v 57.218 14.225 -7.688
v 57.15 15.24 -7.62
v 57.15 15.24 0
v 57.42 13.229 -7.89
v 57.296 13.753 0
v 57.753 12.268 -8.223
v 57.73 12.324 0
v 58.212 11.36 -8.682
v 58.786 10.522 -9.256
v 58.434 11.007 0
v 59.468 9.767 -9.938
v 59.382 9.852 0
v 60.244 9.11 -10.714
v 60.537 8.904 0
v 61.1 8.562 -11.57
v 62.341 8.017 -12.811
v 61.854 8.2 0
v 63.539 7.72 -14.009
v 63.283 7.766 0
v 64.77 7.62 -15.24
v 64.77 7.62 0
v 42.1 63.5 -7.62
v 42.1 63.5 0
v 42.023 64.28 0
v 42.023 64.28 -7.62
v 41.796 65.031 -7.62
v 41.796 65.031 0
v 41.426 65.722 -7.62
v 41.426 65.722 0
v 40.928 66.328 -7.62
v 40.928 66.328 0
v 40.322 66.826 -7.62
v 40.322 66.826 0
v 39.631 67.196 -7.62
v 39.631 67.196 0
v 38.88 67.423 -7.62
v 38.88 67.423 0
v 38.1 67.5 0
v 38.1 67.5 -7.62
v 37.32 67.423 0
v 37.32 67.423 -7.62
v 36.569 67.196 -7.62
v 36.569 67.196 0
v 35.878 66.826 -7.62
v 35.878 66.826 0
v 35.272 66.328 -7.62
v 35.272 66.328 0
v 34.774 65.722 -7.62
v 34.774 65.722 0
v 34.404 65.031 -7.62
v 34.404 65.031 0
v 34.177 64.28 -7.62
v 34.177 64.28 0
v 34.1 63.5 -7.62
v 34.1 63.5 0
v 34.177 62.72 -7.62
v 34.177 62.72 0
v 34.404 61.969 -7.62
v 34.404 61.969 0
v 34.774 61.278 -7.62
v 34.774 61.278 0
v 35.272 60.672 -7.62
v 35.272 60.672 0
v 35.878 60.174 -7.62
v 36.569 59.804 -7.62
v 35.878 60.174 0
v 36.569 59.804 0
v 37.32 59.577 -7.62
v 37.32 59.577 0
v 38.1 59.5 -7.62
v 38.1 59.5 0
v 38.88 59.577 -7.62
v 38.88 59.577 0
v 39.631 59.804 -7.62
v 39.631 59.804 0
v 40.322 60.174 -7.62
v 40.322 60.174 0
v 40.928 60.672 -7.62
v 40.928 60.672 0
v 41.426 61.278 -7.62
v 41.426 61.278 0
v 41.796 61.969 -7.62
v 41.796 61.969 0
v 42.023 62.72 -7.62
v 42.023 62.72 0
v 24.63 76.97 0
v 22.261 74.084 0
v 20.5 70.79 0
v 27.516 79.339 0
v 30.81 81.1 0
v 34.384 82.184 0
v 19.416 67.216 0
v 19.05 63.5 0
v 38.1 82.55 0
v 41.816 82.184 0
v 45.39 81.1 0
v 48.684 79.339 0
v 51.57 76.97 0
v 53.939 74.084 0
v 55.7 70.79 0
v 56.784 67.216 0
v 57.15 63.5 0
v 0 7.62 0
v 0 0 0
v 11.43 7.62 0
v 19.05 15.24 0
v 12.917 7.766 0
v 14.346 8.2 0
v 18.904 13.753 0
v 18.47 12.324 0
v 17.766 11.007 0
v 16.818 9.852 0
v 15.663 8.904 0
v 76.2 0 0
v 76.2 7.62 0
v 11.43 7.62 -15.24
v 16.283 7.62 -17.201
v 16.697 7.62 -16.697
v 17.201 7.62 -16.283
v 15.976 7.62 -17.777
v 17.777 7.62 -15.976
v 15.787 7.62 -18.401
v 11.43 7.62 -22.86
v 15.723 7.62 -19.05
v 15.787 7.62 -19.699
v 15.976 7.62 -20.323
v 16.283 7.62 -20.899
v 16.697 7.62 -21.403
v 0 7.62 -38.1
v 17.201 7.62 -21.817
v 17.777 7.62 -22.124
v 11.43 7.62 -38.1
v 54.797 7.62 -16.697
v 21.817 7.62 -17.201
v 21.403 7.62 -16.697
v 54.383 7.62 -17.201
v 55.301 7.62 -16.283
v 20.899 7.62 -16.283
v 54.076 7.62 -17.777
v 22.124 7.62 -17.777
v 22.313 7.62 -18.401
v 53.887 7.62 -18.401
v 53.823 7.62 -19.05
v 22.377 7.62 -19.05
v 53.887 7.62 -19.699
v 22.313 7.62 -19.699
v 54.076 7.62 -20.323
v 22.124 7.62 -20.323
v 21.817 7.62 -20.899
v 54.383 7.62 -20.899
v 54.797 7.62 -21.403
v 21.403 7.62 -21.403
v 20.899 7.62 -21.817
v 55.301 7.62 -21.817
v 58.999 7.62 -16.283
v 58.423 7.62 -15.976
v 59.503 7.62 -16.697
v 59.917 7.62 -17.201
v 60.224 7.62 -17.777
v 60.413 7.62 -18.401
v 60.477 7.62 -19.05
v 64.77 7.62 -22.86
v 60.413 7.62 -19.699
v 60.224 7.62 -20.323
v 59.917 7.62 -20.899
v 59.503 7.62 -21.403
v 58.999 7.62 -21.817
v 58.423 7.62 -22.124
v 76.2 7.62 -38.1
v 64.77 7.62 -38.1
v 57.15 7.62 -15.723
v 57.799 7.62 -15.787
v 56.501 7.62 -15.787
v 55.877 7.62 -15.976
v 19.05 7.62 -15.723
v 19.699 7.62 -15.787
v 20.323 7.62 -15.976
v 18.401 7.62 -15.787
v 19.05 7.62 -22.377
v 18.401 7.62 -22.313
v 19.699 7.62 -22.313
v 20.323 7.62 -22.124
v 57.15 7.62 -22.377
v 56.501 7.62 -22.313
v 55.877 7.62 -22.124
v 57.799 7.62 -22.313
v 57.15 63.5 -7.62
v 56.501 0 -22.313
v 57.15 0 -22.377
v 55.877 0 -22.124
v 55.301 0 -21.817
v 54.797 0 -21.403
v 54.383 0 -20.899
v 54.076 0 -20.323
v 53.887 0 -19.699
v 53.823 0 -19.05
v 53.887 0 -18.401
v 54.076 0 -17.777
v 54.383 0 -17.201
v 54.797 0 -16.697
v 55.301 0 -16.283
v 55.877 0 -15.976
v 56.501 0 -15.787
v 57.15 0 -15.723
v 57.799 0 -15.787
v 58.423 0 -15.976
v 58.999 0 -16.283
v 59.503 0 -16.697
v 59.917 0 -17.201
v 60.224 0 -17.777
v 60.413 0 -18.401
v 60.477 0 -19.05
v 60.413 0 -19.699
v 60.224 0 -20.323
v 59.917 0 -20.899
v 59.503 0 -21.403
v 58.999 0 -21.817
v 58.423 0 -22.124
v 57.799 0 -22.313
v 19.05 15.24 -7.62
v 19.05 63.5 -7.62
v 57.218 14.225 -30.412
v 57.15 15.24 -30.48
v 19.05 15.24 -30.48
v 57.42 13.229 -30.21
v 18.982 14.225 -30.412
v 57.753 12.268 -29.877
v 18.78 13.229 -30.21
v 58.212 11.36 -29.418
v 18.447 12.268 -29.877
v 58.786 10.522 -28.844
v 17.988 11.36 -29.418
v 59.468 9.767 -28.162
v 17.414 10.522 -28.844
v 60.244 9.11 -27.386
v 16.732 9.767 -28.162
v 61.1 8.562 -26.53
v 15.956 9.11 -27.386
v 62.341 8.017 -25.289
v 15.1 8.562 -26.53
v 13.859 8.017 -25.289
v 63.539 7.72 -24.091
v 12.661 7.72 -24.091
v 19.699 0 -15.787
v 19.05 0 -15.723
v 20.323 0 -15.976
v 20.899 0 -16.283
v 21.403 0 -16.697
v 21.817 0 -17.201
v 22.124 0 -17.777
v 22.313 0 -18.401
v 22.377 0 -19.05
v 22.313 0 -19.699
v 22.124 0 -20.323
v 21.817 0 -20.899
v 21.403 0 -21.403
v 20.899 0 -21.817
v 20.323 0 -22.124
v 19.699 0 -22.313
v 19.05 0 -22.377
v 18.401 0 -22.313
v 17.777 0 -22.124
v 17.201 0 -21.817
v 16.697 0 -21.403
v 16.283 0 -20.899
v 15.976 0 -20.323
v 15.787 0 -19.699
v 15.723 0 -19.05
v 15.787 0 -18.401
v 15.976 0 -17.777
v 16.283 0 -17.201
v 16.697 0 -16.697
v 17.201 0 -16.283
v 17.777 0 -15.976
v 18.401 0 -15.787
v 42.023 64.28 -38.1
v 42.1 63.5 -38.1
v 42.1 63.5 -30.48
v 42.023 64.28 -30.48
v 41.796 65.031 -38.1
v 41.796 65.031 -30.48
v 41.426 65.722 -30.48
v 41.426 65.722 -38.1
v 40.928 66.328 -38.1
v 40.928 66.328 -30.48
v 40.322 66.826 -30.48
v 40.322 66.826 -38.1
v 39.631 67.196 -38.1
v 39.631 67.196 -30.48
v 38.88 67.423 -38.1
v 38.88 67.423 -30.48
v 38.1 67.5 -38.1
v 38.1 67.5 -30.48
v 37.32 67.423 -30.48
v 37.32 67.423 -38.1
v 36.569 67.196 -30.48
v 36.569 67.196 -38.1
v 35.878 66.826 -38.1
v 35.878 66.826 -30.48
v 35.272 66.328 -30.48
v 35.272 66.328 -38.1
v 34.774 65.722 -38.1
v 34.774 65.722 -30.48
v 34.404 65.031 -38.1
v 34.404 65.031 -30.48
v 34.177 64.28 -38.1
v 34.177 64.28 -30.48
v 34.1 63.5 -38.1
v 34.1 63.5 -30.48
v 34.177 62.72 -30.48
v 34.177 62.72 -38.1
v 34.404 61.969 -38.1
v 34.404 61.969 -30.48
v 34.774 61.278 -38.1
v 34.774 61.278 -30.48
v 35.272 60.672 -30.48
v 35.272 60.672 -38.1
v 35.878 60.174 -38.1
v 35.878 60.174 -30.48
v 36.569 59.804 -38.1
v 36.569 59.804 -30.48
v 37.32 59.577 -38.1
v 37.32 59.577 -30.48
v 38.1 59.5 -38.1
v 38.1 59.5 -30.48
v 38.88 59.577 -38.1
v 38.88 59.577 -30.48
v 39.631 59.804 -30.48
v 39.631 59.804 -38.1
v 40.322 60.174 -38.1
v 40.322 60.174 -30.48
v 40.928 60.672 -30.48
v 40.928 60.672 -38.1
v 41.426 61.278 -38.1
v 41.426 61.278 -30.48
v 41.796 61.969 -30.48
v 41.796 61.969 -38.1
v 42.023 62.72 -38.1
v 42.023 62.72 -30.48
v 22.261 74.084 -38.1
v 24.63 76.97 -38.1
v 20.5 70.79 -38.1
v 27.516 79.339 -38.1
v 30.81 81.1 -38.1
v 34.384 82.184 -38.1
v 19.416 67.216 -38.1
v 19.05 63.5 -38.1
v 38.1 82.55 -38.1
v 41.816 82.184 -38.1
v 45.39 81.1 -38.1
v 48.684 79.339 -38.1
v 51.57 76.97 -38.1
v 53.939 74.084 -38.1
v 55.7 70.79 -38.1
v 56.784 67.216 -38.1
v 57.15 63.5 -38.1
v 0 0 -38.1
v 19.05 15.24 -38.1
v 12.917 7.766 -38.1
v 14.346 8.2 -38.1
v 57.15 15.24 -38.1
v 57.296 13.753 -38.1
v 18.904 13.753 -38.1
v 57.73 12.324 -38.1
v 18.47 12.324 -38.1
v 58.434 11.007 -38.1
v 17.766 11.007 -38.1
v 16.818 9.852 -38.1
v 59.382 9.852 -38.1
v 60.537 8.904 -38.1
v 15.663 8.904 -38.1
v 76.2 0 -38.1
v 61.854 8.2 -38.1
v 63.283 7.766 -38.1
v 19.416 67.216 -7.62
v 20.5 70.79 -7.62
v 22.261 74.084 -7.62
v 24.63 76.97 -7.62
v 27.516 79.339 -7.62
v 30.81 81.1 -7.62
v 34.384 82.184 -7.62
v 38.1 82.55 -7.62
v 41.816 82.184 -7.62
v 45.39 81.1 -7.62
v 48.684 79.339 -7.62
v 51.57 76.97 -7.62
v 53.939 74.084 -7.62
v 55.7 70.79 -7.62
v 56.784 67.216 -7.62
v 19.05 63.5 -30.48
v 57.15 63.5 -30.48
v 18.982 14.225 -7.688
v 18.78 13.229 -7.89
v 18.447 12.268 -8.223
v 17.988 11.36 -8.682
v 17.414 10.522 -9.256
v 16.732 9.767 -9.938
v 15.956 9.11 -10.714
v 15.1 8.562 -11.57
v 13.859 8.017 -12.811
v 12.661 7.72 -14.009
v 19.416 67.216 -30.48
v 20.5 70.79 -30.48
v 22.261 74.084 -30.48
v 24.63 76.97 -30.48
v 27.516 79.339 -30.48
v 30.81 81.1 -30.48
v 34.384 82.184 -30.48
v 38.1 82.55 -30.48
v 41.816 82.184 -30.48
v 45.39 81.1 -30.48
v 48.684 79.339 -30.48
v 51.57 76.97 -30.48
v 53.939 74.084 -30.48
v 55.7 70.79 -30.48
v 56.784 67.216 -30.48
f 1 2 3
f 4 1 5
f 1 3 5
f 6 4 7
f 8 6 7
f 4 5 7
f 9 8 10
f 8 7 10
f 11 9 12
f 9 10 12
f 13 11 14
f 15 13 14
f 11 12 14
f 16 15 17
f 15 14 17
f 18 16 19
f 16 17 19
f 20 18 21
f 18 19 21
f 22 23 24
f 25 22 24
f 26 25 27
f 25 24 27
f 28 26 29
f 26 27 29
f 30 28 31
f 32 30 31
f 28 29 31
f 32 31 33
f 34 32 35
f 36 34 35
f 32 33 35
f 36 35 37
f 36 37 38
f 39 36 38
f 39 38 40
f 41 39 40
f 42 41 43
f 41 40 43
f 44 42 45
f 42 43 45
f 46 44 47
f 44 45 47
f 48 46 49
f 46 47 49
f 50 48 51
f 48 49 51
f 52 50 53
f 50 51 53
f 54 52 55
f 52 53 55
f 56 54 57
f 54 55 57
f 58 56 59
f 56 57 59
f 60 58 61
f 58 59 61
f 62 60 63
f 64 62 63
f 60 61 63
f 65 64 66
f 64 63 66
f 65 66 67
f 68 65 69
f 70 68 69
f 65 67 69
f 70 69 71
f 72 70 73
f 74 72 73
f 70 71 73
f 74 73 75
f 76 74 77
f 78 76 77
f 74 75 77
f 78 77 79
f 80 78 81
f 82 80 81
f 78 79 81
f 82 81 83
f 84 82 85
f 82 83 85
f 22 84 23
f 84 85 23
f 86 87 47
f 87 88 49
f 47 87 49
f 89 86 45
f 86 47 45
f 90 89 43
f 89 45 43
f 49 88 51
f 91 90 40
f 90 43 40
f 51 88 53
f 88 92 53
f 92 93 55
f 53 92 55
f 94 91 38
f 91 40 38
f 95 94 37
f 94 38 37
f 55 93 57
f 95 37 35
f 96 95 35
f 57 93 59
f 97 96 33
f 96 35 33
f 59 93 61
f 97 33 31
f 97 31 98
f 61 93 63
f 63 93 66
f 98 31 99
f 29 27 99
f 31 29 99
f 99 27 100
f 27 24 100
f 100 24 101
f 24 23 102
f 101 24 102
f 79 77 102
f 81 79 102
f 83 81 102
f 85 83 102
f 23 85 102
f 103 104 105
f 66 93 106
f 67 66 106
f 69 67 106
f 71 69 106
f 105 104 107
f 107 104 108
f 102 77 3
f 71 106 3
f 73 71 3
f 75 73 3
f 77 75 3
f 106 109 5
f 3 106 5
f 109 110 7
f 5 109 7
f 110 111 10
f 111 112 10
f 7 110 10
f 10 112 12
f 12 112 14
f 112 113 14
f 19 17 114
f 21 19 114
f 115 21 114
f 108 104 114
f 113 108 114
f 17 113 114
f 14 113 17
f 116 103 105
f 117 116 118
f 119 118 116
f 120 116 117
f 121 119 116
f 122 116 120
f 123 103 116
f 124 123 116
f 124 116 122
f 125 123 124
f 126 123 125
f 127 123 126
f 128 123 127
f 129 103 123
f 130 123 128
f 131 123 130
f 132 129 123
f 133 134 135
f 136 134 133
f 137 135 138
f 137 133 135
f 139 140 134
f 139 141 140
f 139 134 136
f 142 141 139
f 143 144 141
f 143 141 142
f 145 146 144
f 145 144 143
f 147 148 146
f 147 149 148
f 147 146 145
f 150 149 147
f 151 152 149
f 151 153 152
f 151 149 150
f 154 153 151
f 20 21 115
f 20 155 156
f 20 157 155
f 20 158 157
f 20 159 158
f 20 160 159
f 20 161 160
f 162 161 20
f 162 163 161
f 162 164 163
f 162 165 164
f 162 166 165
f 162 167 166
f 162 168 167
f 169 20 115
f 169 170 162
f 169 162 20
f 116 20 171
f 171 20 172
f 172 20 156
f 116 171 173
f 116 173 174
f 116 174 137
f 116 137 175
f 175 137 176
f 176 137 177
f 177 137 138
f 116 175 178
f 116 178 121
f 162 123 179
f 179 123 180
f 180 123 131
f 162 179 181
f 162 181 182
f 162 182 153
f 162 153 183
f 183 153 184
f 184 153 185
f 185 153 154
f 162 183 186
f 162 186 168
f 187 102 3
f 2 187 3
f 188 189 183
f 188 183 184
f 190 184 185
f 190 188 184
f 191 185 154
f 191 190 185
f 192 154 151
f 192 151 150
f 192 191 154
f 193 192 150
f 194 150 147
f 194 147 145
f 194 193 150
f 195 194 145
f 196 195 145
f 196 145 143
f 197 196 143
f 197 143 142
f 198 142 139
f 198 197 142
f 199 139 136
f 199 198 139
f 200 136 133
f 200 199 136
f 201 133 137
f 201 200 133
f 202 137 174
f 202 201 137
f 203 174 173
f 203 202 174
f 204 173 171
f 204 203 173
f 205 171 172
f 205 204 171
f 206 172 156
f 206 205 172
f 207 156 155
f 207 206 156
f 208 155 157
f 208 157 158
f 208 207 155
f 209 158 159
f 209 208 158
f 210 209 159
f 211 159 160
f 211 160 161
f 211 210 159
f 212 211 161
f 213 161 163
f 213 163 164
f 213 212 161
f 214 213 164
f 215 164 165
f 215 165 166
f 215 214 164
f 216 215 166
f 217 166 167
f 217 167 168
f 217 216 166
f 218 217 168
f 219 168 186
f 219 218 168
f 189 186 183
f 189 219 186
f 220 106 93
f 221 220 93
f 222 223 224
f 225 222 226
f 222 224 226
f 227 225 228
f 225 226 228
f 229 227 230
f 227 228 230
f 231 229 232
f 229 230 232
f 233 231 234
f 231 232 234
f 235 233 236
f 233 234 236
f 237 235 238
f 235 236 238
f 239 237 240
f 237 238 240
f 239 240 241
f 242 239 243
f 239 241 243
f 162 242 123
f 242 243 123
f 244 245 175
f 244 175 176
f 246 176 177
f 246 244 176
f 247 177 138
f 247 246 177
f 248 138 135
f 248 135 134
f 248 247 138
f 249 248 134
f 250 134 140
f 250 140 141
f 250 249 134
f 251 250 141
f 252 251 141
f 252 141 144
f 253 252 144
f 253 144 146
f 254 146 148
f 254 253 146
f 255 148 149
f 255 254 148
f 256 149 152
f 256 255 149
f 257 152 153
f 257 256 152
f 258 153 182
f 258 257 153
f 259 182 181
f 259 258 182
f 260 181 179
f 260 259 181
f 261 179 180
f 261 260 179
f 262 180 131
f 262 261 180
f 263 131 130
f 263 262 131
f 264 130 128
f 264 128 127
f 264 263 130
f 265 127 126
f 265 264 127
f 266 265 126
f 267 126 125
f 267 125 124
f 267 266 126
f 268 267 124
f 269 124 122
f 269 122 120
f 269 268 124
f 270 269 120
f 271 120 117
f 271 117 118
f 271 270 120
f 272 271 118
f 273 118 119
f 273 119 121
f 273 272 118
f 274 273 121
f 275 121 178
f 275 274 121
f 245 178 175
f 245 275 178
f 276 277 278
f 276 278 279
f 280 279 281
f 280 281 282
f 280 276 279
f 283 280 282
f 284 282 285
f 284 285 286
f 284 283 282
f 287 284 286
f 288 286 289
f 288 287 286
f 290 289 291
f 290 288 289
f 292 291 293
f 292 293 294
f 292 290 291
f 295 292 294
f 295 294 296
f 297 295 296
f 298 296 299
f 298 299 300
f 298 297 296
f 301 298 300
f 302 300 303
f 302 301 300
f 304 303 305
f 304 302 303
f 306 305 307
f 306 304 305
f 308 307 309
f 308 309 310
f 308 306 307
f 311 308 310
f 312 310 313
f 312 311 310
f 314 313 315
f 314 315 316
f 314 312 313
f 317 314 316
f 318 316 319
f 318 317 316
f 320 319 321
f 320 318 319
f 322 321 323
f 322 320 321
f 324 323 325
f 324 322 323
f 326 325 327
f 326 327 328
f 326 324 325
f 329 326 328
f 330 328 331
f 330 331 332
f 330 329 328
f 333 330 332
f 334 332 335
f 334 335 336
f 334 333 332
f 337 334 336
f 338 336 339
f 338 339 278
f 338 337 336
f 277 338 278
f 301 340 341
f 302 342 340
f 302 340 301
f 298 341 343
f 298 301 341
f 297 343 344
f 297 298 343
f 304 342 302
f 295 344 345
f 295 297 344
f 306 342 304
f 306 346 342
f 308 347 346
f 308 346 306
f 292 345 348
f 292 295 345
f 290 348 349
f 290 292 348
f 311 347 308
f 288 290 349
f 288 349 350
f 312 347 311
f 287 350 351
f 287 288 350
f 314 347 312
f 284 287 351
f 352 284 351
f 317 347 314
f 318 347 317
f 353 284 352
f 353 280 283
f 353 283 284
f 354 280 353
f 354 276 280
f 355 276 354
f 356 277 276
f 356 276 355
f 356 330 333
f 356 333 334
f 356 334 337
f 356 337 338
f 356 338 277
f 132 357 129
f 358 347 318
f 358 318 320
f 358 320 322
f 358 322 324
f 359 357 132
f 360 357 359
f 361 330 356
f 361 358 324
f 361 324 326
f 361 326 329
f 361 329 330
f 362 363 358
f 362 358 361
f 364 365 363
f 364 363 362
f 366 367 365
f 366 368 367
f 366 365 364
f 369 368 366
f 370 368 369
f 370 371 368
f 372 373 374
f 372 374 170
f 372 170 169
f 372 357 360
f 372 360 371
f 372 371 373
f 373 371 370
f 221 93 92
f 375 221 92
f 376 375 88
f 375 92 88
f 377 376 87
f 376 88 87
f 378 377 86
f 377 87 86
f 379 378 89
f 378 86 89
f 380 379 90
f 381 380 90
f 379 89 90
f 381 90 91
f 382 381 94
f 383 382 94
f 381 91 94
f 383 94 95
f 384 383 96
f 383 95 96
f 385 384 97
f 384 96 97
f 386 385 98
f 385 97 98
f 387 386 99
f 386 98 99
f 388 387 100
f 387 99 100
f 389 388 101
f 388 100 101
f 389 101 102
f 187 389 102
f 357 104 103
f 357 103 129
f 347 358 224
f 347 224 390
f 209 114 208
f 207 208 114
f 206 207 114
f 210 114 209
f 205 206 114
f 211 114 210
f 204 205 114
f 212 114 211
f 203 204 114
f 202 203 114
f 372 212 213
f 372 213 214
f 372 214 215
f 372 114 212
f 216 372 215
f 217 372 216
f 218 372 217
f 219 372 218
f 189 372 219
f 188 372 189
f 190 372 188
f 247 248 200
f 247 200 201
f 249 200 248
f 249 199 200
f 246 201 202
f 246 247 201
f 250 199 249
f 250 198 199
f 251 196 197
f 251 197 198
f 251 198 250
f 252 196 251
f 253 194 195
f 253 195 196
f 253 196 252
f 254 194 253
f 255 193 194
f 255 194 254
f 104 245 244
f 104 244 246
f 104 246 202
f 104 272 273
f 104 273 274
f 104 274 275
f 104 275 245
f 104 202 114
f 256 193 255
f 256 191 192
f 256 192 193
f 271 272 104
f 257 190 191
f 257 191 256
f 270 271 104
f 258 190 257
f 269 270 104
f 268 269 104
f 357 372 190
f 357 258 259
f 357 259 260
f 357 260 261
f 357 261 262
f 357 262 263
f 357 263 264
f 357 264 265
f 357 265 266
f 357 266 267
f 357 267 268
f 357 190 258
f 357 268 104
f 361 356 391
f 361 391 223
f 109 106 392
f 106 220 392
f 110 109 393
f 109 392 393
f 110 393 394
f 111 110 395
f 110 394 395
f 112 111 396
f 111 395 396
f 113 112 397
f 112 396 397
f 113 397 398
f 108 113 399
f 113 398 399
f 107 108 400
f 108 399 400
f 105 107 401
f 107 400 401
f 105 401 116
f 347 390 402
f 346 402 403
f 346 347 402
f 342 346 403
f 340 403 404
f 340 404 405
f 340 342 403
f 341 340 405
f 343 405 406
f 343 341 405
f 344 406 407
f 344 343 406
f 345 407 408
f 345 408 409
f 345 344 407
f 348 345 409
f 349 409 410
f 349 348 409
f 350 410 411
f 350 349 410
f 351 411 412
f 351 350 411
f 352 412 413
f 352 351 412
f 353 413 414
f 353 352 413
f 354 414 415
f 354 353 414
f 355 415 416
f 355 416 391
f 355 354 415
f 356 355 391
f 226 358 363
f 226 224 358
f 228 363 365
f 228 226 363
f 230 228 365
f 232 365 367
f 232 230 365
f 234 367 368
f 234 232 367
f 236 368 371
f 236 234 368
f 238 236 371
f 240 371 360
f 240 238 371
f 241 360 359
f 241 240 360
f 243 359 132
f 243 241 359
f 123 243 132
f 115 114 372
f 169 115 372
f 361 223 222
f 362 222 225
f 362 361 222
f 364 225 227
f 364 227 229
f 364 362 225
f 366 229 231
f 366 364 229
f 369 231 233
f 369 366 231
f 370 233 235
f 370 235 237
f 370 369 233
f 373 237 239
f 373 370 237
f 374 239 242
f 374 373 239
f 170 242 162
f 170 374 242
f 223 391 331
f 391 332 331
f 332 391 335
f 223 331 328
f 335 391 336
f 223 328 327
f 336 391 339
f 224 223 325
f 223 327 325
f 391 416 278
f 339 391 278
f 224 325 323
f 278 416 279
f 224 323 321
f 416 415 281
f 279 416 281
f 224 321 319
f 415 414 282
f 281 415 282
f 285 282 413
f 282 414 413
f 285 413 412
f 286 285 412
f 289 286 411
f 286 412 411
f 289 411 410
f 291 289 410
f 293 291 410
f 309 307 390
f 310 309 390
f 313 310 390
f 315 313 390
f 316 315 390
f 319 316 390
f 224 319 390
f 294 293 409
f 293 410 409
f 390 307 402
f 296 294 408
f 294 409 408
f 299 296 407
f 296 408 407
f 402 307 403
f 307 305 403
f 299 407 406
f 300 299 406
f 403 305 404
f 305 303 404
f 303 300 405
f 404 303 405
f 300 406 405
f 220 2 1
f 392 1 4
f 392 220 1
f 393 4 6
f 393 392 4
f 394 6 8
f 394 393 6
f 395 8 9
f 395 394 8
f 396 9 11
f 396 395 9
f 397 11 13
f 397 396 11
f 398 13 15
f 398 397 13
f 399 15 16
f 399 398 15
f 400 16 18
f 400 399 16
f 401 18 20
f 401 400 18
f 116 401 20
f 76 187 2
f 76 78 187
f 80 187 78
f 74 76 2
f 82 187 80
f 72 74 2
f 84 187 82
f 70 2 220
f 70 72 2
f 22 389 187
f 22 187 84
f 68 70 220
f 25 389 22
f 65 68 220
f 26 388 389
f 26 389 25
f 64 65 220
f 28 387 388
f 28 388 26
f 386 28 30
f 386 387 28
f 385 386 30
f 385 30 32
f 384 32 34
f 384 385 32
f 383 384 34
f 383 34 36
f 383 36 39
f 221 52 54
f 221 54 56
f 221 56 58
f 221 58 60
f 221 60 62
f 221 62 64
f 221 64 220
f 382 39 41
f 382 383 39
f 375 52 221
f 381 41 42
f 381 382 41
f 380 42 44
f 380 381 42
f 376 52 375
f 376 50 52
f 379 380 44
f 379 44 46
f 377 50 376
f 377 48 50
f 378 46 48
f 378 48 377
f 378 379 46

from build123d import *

# Parameters (mm, degrees)
SKETCH1_W            = 76.2
SKETCH1_H            = 38.1
SKETCH1_R            = 3.3274
BOSS_EXTRUDE1_DEPTH  = 7.62
SKETCH2_R            = 4
BOSS_EXTRUDE2_DEPTH  = 7.62
FILLET1_R            = 7.62
FILLET1_OF_MIRROR2_R = 7.62


with BuildPart() as part:
    # Sketch1 → Boss-Extrude1 (new body)
    with BuildSketch(Plane(origin=(0, 0, 0), x_dir=(1, 0, 0), z_dir=(0, 1, 0))):
        with Locations((38.1, 19.05)):
            Rectangle(SKETCH1_W, SKETCH1_H)
        with Locations(Location((19.05, 19.05, 0), (0, 0, 270))):
            Circle(SKETCH1_R, mode=Mode.SUBTRACT)
        with Locations(Location((57.15, 19.05, 0), (0, 0, 90))):
            Circle(SKETCH1_R, mode=Mode.SUBTRACT)
    extrude(amount=BOSS_EXTRUDE1_DEPTH)

    # Sketch2 → Boss-Extrude2 (add)
    with BuildSketch(Plane.XY):
        with BuildLine():
            Line((19.05, 0), (19.05, 63.5))
            ThreePointArc((19.05, 63.5), (38.1, 82.55), (57.15, 63.5))
            Line((57.15, 63.5), (57.15, 0))
            Line((57.15, 0), (19.05, 0))
        make_face()
        with Locations((38.1, 63.5)):
            Circle(SKETCH2_R, mode=Mode.SUBTRACT)
    boss_extrude2 = extrude(amount=-BOSS_EXTRUDE2_DEPTH)

    # Fillet1
    fillet1_edges = [part.edges().sort_by_distance(p)[0] for p in [
        (19.05, 7.62, -3.81),
        (57.15, 7.62, -3.81),
        (38.1, 7.62, -7.62),
    ]]
    fillet(fillet1_edges, radius=FILLET1_R)

    # Mirror2: Boss-Extrude2 across plane
    add(boss_extrude2.mirror(Plane.XY.offset(-19.05)))

    # Fillet1 of Mirror2
    fillet1_of_mirror2_edges = [part.edges().sort_by_distance(p)[0] for p in [
        (19.05, 7.62, -34.29),
        (57.15, 7.62, -34.29),
        (38.1, 7.62, -30.48),
    ]]
    fillet(fillet1_of_mirror2_edges, radius=FILLET1_OF_MIRROR2_R)


solid = part.part
